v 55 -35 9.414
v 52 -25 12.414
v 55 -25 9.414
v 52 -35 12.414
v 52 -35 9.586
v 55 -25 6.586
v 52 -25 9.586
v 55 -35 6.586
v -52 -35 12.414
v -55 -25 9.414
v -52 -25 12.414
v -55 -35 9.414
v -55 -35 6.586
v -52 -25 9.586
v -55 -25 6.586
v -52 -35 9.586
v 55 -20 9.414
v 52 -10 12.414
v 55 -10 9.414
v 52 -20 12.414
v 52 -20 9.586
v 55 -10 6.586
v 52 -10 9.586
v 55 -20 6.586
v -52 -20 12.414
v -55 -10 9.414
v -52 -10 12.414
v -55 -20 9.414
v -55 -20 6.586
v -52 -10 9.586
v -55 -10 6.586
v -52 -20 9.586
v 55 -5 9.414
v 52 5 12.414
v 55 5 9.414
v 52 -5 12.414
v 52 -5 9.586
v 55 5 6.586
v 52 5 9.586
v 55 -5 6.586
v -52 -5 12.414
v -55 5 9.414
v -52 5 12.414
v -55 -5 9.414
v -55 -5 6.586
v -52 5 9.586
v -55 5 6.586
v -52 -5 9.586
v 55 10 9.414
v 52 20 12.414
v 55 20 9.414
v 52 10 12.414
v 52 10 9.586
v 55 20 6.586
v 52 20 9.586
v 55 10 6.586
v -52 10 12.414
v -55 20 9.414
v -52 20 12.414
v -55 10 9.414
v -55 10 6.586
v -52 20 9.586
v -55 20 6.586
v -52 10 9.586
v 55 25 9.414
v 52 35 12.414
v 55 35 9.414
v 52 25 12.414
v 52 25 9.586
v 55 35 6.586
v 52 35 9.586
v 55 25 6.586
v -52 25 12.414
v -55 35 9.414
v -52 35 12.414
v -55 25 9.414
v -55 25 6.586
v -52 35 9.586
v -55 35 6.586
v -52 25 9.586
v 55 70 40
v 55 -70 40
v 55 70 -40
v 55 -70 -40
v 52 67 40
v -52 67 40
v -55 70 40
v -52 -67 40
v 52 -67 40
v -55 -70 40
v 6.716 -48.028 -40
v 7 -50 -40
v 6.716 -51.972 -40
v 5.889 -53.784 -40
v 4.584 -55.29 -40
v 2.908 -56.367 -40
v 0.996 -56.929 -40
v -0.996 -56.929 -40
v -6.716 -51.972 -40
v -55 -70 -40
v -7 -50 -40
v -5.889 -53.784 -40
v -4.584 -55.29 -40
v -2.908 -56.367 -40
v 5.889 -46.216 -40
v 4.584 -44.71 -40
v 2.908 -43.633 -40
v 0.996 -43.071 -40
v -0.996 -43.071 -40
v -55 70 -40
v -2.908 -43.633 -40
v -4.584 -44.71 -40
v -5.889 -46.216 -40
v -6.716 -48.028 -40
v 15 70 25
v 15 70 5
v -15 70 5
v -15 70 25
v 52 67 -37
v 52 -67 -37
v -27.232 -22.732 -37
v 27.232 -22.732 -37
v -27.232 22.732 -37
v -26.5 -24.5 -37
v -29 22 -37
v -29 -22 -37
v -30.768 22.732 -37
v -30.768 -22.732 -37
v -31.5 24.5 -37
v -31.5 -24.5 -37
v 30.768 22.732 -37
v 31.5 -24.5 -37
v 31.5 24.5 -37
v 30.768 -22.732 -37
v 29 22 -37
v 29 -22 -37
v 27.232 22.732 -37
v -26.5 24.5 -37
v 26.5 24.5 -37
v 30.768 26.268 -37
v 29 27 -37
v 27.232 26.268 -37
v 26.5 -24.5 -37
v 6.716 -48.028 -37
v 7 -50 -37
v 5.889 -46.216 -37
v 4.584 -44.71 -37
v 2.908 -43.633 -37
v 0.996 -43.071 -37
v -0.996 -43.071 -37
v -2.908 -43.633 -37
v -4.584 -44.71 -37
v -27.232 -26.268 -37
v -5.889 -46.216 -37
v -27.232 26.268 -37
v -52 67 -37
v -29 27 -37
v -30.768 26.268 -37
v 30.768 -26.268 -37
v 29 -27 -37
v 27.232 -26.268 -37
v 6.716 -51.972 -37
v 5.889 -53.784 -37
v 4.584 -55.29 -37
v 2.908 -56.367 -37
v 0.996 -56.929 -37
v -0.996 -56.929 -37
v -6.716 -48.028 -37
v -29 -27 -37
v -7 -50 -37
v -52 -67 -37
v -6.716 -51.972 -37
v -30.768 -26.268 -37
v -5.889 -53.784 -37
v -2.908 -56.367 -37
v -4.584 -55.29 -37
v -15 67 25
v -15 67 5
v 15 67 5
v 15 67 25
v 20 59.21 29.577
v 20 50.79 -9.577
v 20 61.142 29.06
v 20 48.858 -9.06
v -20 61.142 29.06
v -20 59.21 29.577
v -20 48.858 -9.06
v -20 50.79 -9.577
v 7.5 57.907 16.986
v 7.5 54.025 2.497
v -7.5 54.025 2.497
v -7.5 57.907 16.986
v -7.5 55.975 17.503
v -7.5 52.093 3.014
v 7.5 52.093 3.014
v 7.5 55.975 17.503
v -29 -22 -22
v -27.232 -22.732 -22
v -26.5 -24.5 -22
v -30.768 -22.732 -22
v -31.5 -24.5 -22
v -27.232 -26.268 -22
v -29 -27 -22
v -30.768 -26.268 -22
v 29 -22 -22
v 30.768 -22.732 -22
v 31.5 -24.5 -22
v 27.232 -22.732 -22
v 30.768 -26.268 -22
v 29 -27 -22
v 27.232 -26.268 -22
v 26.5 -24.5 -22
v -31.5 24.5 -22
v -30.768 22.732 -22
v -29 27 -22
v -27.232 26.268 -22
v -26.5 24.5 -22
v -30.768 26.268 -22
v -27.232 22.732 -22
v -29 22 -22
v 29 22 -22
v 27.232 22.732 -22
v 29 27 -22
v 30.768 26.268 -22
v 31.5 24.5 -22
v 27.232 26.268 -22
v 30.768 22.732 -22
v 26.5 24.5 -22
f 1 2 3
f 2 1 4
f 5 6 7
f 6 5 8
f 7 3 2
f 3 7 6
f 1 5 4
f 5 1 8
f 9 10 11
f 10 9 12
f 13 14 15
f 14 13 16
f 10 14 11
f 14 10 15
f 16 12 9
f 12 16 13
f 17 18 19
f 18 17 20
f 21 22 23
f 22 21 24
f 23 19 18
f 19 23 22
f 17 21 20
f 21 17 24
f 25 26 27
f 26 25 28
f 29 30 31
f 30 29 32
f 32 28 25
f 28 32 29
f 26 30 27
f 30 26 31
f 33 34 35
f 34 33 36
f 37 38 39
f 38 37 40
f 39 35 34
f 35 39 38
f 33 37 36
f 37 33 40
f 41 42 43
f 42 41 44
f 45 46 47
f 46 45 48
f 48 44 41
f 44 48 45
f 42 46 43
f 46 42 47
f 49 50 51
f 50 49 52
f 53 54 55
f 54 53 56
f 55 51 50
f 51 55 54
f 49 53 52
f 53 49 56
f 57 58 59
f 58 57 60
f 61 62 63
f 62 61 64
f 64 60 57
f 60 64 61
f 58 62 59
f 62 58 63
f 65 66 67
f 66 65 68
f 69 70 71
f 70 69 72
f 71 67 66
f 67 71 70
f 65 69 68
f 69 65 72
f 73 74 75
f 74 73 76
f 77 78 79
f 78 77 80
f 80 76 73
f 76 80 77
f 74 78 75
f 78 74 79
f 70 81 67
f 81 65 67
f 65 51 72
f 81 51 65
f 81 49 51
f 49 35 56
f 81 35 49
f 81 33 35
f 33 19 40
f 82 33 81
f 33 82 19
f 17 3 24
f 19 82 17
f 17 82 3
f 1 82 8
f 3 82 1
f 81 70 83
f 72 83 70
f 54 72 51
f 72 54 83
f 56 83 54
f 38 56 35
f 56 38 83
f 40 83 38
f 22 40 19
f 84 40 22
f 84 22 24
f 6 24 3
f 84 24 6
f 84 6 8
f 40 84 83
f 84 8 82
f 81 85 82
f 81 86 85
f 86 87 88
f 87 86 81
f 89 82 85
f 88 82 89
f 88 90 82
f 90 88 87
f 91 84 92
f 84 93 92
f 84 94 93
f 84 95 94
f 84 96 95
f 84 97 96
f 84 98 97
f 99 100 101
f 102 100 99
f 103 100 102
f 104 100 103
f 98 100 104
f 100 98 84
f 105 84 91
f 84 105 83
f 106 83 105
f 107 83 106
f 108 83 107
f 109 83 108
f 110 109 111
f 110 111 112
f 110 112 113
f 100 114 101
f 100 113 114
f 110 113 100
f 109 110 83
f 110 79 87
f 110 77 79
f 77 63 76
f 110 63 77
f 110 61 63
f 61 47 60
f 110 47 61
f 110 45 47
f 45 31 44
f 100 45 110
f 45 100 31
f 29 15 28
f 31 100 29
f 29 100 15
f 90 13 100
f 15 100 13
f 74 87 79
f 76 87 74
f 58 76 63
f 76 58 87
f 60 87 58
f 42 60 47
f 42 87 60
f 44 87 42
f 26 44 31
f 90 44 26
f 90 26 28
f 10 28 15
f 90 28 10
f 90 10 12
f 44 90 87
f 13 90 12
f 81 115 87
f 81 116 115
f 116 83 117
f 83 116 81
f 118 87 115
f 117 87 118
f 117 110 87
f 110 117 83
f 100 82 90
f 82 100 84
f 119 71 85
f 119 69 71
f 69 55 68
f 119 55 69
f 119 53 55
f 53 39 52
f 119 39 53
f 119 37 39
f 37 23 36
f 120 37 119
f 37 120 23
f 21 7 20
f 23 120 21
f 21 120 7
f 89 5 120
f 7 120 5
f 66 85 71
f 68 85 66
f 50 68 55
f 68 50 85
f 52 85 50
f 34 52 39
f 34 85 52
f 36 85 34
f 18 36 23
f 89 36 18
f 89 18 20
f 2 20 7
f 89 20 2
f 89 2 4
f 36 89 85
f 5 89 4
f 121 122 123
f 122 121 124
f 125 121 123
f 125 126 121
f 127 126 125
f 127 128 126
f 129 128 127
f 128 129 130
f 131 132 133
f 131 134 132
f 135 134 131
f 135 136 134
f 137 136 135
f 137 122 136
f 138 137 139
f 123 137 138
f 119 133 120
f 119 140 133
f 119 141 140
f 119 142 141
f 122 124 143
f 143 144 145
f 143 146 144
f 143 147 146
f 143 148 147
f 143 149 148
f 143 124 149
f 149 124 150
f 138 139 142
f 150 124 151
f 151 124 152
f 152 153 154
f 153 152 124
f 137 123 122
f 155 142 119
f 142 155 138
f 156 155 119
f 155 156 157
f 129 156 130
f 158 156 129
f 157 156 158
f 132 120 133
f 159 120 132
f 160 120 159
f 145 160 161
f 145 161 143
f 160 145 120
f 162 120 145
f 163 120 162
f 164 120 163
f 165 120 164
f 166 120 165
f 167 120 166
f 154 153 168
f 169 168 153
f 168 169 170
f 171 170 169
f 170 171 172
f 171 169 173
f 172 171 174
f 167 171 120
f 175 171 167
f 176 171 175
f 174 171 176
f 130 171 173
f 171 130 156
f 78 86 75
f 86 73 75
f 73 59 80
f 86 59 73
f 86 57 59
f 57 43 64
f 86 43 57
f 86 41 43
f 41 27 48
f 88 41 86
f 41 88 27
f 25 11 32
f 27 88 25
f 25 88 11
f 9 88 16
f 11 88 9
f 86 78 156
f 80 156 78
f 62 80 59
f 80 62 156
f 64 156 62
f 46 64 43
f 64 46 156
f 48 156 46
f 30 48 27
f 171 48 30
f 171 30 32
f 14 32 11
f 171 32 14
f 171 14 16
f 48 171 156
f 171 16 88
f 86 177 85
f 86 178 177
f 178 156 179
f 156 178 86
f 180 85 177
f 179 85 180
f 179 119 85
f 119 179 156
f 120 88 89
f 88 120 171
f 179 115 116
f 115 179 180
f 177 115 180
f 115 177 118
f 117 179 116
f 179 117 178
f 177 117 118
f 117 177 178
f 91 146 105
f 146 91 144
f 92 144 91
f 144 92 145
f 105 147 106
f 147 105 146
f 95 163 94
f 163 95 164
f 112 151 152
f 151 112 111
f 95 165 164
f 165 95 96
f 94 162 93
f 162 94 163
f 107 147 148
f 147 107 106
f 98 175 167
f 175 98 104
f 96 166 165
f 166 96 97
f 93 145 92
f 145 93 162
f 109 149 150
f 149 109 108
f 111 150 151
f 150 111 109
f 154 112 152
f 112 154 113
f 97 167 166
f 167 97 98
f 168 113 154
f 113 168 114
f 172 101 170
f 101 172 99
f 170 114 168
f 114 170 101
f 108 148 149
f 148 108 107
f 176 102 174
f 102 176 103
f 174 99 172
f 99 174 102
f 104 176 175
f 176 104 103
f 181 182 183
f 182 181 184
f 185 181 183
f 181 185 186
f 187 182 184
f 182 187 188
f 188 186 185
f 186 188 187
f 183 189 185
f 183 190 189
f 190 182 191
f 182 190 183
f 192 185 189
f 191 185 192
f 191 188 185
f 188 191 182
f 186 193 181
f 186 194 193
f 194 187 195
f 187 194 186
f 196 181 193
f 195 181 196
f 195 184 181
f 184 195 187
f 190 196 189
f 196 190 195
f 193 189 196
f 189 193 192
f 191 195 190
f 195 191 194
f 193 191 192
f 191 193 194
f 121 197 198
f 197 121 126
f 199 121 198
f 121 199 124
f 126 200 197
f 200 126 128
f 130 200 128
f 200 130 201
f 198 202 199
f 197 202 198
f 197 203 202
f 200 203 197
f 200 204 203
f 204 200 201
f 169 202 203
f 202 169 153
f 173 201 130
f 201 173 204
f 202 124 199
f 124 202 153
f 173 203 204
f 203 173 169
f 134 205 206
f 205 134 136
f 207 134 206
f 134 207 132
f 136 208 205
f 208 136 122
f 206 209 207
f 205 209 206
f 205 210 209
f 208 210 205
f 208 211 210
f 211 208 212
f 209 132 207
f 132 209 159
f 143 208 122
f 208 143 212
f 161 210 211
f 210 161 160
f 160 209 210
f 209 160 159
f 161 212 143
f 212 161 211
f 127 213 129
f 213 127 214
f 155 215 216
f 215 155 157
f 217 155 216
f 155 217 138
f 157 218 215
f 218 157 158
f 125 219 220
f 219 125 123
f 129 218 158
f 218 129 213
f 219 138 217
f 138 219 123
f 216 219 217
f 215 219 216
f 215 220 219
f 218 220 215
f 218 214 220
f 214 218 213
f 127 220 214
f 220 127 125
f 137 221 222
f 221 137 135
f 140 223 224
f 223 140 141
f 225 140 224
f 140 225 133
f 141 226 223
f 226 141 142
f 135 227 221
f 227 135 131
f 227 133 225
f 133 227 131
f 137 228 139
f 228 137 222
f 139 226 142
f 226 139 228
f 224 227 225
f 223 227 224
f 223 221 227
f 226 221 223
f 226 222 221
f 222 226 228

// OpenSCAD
// --- Raspberry Pi 4 + Cam V3 + Breadboard Outdoor Case Design ---

// Parameters
case_w = 110;
case_d = 140;
case_h = 80;
wall_thick = 3;

module main_case() {
    difference() {
        // Main Body
        cube([case_w, case_d, case_h], center = true);

        // Hollow Interior
        translate([0,0,wall_thick])
            cube([case_w-wall_thick*2, case_d-wall_thick*2, case_h], center = true);

        // 1. Camera Window (Front)
        translate([0, case_d/2 - 2, 15])
            cube([30, 10, 20], center = true);

        // 2. Cooling Vents (Side - Louvers style)
        for (i = [-2 : 2]) {
            translate([case_w/2 - 2, i*15, 10])
                rotate([0, 45, 0]) cube([10, 10, 2], center = true);
            translate([-case_w/2 + 2, i*15, 10])
                rotate([0, -45, 0]) cube([10, 10, 2], center = true);
        }

        // 3. Power Cable Hole (Bottom)
        translate([0, -case_d/2 + 20, -case_h/2])
            cylinder(h = 20, r = 7, center = true);
    }
}

module internals() {
    // 4. Raspberry Pi 4 Mounts (Stands)
    // Standard Pi 4 holes: 58mm x 49mm
    translate([-29, -24.5, -case_h/2 + wall_thick])
        cylinder(h=15, r=2.5); // Hole 1
    translate([29, -24.5, -case_h/2 + wall_thick])
        cylinder(h=15, r=2.5); // Hole 2
    translate([-29, 24.5, -case_h/2 + wall_thick])
        cylinder(h=15, r=2.5); // Hole 3
    translate([29, 24.5, -case_h/2 + wall_thick])
        cylinder(h=15, r=2.5); // Hole 4

    // 5. Camera Mount (Angled 15 degrees)
    translate([0, case_d/2 - 15, 10])
        rotate([-15, 0, 0])
        difference() {
            cube([40, 2, 40], center = true);
            cube([15, 5, 15], center = true); // Lens hole
        }

    // 6. Breadboard Holder (Bottom Area)
    translate([0, -30, -case_h/2 + wall_thick + 2])
        %cube([55, 85, 5], center = true); // Ghost preview of breadboard
}

// Render the design
union() {
    main_case();
    internals();
}
